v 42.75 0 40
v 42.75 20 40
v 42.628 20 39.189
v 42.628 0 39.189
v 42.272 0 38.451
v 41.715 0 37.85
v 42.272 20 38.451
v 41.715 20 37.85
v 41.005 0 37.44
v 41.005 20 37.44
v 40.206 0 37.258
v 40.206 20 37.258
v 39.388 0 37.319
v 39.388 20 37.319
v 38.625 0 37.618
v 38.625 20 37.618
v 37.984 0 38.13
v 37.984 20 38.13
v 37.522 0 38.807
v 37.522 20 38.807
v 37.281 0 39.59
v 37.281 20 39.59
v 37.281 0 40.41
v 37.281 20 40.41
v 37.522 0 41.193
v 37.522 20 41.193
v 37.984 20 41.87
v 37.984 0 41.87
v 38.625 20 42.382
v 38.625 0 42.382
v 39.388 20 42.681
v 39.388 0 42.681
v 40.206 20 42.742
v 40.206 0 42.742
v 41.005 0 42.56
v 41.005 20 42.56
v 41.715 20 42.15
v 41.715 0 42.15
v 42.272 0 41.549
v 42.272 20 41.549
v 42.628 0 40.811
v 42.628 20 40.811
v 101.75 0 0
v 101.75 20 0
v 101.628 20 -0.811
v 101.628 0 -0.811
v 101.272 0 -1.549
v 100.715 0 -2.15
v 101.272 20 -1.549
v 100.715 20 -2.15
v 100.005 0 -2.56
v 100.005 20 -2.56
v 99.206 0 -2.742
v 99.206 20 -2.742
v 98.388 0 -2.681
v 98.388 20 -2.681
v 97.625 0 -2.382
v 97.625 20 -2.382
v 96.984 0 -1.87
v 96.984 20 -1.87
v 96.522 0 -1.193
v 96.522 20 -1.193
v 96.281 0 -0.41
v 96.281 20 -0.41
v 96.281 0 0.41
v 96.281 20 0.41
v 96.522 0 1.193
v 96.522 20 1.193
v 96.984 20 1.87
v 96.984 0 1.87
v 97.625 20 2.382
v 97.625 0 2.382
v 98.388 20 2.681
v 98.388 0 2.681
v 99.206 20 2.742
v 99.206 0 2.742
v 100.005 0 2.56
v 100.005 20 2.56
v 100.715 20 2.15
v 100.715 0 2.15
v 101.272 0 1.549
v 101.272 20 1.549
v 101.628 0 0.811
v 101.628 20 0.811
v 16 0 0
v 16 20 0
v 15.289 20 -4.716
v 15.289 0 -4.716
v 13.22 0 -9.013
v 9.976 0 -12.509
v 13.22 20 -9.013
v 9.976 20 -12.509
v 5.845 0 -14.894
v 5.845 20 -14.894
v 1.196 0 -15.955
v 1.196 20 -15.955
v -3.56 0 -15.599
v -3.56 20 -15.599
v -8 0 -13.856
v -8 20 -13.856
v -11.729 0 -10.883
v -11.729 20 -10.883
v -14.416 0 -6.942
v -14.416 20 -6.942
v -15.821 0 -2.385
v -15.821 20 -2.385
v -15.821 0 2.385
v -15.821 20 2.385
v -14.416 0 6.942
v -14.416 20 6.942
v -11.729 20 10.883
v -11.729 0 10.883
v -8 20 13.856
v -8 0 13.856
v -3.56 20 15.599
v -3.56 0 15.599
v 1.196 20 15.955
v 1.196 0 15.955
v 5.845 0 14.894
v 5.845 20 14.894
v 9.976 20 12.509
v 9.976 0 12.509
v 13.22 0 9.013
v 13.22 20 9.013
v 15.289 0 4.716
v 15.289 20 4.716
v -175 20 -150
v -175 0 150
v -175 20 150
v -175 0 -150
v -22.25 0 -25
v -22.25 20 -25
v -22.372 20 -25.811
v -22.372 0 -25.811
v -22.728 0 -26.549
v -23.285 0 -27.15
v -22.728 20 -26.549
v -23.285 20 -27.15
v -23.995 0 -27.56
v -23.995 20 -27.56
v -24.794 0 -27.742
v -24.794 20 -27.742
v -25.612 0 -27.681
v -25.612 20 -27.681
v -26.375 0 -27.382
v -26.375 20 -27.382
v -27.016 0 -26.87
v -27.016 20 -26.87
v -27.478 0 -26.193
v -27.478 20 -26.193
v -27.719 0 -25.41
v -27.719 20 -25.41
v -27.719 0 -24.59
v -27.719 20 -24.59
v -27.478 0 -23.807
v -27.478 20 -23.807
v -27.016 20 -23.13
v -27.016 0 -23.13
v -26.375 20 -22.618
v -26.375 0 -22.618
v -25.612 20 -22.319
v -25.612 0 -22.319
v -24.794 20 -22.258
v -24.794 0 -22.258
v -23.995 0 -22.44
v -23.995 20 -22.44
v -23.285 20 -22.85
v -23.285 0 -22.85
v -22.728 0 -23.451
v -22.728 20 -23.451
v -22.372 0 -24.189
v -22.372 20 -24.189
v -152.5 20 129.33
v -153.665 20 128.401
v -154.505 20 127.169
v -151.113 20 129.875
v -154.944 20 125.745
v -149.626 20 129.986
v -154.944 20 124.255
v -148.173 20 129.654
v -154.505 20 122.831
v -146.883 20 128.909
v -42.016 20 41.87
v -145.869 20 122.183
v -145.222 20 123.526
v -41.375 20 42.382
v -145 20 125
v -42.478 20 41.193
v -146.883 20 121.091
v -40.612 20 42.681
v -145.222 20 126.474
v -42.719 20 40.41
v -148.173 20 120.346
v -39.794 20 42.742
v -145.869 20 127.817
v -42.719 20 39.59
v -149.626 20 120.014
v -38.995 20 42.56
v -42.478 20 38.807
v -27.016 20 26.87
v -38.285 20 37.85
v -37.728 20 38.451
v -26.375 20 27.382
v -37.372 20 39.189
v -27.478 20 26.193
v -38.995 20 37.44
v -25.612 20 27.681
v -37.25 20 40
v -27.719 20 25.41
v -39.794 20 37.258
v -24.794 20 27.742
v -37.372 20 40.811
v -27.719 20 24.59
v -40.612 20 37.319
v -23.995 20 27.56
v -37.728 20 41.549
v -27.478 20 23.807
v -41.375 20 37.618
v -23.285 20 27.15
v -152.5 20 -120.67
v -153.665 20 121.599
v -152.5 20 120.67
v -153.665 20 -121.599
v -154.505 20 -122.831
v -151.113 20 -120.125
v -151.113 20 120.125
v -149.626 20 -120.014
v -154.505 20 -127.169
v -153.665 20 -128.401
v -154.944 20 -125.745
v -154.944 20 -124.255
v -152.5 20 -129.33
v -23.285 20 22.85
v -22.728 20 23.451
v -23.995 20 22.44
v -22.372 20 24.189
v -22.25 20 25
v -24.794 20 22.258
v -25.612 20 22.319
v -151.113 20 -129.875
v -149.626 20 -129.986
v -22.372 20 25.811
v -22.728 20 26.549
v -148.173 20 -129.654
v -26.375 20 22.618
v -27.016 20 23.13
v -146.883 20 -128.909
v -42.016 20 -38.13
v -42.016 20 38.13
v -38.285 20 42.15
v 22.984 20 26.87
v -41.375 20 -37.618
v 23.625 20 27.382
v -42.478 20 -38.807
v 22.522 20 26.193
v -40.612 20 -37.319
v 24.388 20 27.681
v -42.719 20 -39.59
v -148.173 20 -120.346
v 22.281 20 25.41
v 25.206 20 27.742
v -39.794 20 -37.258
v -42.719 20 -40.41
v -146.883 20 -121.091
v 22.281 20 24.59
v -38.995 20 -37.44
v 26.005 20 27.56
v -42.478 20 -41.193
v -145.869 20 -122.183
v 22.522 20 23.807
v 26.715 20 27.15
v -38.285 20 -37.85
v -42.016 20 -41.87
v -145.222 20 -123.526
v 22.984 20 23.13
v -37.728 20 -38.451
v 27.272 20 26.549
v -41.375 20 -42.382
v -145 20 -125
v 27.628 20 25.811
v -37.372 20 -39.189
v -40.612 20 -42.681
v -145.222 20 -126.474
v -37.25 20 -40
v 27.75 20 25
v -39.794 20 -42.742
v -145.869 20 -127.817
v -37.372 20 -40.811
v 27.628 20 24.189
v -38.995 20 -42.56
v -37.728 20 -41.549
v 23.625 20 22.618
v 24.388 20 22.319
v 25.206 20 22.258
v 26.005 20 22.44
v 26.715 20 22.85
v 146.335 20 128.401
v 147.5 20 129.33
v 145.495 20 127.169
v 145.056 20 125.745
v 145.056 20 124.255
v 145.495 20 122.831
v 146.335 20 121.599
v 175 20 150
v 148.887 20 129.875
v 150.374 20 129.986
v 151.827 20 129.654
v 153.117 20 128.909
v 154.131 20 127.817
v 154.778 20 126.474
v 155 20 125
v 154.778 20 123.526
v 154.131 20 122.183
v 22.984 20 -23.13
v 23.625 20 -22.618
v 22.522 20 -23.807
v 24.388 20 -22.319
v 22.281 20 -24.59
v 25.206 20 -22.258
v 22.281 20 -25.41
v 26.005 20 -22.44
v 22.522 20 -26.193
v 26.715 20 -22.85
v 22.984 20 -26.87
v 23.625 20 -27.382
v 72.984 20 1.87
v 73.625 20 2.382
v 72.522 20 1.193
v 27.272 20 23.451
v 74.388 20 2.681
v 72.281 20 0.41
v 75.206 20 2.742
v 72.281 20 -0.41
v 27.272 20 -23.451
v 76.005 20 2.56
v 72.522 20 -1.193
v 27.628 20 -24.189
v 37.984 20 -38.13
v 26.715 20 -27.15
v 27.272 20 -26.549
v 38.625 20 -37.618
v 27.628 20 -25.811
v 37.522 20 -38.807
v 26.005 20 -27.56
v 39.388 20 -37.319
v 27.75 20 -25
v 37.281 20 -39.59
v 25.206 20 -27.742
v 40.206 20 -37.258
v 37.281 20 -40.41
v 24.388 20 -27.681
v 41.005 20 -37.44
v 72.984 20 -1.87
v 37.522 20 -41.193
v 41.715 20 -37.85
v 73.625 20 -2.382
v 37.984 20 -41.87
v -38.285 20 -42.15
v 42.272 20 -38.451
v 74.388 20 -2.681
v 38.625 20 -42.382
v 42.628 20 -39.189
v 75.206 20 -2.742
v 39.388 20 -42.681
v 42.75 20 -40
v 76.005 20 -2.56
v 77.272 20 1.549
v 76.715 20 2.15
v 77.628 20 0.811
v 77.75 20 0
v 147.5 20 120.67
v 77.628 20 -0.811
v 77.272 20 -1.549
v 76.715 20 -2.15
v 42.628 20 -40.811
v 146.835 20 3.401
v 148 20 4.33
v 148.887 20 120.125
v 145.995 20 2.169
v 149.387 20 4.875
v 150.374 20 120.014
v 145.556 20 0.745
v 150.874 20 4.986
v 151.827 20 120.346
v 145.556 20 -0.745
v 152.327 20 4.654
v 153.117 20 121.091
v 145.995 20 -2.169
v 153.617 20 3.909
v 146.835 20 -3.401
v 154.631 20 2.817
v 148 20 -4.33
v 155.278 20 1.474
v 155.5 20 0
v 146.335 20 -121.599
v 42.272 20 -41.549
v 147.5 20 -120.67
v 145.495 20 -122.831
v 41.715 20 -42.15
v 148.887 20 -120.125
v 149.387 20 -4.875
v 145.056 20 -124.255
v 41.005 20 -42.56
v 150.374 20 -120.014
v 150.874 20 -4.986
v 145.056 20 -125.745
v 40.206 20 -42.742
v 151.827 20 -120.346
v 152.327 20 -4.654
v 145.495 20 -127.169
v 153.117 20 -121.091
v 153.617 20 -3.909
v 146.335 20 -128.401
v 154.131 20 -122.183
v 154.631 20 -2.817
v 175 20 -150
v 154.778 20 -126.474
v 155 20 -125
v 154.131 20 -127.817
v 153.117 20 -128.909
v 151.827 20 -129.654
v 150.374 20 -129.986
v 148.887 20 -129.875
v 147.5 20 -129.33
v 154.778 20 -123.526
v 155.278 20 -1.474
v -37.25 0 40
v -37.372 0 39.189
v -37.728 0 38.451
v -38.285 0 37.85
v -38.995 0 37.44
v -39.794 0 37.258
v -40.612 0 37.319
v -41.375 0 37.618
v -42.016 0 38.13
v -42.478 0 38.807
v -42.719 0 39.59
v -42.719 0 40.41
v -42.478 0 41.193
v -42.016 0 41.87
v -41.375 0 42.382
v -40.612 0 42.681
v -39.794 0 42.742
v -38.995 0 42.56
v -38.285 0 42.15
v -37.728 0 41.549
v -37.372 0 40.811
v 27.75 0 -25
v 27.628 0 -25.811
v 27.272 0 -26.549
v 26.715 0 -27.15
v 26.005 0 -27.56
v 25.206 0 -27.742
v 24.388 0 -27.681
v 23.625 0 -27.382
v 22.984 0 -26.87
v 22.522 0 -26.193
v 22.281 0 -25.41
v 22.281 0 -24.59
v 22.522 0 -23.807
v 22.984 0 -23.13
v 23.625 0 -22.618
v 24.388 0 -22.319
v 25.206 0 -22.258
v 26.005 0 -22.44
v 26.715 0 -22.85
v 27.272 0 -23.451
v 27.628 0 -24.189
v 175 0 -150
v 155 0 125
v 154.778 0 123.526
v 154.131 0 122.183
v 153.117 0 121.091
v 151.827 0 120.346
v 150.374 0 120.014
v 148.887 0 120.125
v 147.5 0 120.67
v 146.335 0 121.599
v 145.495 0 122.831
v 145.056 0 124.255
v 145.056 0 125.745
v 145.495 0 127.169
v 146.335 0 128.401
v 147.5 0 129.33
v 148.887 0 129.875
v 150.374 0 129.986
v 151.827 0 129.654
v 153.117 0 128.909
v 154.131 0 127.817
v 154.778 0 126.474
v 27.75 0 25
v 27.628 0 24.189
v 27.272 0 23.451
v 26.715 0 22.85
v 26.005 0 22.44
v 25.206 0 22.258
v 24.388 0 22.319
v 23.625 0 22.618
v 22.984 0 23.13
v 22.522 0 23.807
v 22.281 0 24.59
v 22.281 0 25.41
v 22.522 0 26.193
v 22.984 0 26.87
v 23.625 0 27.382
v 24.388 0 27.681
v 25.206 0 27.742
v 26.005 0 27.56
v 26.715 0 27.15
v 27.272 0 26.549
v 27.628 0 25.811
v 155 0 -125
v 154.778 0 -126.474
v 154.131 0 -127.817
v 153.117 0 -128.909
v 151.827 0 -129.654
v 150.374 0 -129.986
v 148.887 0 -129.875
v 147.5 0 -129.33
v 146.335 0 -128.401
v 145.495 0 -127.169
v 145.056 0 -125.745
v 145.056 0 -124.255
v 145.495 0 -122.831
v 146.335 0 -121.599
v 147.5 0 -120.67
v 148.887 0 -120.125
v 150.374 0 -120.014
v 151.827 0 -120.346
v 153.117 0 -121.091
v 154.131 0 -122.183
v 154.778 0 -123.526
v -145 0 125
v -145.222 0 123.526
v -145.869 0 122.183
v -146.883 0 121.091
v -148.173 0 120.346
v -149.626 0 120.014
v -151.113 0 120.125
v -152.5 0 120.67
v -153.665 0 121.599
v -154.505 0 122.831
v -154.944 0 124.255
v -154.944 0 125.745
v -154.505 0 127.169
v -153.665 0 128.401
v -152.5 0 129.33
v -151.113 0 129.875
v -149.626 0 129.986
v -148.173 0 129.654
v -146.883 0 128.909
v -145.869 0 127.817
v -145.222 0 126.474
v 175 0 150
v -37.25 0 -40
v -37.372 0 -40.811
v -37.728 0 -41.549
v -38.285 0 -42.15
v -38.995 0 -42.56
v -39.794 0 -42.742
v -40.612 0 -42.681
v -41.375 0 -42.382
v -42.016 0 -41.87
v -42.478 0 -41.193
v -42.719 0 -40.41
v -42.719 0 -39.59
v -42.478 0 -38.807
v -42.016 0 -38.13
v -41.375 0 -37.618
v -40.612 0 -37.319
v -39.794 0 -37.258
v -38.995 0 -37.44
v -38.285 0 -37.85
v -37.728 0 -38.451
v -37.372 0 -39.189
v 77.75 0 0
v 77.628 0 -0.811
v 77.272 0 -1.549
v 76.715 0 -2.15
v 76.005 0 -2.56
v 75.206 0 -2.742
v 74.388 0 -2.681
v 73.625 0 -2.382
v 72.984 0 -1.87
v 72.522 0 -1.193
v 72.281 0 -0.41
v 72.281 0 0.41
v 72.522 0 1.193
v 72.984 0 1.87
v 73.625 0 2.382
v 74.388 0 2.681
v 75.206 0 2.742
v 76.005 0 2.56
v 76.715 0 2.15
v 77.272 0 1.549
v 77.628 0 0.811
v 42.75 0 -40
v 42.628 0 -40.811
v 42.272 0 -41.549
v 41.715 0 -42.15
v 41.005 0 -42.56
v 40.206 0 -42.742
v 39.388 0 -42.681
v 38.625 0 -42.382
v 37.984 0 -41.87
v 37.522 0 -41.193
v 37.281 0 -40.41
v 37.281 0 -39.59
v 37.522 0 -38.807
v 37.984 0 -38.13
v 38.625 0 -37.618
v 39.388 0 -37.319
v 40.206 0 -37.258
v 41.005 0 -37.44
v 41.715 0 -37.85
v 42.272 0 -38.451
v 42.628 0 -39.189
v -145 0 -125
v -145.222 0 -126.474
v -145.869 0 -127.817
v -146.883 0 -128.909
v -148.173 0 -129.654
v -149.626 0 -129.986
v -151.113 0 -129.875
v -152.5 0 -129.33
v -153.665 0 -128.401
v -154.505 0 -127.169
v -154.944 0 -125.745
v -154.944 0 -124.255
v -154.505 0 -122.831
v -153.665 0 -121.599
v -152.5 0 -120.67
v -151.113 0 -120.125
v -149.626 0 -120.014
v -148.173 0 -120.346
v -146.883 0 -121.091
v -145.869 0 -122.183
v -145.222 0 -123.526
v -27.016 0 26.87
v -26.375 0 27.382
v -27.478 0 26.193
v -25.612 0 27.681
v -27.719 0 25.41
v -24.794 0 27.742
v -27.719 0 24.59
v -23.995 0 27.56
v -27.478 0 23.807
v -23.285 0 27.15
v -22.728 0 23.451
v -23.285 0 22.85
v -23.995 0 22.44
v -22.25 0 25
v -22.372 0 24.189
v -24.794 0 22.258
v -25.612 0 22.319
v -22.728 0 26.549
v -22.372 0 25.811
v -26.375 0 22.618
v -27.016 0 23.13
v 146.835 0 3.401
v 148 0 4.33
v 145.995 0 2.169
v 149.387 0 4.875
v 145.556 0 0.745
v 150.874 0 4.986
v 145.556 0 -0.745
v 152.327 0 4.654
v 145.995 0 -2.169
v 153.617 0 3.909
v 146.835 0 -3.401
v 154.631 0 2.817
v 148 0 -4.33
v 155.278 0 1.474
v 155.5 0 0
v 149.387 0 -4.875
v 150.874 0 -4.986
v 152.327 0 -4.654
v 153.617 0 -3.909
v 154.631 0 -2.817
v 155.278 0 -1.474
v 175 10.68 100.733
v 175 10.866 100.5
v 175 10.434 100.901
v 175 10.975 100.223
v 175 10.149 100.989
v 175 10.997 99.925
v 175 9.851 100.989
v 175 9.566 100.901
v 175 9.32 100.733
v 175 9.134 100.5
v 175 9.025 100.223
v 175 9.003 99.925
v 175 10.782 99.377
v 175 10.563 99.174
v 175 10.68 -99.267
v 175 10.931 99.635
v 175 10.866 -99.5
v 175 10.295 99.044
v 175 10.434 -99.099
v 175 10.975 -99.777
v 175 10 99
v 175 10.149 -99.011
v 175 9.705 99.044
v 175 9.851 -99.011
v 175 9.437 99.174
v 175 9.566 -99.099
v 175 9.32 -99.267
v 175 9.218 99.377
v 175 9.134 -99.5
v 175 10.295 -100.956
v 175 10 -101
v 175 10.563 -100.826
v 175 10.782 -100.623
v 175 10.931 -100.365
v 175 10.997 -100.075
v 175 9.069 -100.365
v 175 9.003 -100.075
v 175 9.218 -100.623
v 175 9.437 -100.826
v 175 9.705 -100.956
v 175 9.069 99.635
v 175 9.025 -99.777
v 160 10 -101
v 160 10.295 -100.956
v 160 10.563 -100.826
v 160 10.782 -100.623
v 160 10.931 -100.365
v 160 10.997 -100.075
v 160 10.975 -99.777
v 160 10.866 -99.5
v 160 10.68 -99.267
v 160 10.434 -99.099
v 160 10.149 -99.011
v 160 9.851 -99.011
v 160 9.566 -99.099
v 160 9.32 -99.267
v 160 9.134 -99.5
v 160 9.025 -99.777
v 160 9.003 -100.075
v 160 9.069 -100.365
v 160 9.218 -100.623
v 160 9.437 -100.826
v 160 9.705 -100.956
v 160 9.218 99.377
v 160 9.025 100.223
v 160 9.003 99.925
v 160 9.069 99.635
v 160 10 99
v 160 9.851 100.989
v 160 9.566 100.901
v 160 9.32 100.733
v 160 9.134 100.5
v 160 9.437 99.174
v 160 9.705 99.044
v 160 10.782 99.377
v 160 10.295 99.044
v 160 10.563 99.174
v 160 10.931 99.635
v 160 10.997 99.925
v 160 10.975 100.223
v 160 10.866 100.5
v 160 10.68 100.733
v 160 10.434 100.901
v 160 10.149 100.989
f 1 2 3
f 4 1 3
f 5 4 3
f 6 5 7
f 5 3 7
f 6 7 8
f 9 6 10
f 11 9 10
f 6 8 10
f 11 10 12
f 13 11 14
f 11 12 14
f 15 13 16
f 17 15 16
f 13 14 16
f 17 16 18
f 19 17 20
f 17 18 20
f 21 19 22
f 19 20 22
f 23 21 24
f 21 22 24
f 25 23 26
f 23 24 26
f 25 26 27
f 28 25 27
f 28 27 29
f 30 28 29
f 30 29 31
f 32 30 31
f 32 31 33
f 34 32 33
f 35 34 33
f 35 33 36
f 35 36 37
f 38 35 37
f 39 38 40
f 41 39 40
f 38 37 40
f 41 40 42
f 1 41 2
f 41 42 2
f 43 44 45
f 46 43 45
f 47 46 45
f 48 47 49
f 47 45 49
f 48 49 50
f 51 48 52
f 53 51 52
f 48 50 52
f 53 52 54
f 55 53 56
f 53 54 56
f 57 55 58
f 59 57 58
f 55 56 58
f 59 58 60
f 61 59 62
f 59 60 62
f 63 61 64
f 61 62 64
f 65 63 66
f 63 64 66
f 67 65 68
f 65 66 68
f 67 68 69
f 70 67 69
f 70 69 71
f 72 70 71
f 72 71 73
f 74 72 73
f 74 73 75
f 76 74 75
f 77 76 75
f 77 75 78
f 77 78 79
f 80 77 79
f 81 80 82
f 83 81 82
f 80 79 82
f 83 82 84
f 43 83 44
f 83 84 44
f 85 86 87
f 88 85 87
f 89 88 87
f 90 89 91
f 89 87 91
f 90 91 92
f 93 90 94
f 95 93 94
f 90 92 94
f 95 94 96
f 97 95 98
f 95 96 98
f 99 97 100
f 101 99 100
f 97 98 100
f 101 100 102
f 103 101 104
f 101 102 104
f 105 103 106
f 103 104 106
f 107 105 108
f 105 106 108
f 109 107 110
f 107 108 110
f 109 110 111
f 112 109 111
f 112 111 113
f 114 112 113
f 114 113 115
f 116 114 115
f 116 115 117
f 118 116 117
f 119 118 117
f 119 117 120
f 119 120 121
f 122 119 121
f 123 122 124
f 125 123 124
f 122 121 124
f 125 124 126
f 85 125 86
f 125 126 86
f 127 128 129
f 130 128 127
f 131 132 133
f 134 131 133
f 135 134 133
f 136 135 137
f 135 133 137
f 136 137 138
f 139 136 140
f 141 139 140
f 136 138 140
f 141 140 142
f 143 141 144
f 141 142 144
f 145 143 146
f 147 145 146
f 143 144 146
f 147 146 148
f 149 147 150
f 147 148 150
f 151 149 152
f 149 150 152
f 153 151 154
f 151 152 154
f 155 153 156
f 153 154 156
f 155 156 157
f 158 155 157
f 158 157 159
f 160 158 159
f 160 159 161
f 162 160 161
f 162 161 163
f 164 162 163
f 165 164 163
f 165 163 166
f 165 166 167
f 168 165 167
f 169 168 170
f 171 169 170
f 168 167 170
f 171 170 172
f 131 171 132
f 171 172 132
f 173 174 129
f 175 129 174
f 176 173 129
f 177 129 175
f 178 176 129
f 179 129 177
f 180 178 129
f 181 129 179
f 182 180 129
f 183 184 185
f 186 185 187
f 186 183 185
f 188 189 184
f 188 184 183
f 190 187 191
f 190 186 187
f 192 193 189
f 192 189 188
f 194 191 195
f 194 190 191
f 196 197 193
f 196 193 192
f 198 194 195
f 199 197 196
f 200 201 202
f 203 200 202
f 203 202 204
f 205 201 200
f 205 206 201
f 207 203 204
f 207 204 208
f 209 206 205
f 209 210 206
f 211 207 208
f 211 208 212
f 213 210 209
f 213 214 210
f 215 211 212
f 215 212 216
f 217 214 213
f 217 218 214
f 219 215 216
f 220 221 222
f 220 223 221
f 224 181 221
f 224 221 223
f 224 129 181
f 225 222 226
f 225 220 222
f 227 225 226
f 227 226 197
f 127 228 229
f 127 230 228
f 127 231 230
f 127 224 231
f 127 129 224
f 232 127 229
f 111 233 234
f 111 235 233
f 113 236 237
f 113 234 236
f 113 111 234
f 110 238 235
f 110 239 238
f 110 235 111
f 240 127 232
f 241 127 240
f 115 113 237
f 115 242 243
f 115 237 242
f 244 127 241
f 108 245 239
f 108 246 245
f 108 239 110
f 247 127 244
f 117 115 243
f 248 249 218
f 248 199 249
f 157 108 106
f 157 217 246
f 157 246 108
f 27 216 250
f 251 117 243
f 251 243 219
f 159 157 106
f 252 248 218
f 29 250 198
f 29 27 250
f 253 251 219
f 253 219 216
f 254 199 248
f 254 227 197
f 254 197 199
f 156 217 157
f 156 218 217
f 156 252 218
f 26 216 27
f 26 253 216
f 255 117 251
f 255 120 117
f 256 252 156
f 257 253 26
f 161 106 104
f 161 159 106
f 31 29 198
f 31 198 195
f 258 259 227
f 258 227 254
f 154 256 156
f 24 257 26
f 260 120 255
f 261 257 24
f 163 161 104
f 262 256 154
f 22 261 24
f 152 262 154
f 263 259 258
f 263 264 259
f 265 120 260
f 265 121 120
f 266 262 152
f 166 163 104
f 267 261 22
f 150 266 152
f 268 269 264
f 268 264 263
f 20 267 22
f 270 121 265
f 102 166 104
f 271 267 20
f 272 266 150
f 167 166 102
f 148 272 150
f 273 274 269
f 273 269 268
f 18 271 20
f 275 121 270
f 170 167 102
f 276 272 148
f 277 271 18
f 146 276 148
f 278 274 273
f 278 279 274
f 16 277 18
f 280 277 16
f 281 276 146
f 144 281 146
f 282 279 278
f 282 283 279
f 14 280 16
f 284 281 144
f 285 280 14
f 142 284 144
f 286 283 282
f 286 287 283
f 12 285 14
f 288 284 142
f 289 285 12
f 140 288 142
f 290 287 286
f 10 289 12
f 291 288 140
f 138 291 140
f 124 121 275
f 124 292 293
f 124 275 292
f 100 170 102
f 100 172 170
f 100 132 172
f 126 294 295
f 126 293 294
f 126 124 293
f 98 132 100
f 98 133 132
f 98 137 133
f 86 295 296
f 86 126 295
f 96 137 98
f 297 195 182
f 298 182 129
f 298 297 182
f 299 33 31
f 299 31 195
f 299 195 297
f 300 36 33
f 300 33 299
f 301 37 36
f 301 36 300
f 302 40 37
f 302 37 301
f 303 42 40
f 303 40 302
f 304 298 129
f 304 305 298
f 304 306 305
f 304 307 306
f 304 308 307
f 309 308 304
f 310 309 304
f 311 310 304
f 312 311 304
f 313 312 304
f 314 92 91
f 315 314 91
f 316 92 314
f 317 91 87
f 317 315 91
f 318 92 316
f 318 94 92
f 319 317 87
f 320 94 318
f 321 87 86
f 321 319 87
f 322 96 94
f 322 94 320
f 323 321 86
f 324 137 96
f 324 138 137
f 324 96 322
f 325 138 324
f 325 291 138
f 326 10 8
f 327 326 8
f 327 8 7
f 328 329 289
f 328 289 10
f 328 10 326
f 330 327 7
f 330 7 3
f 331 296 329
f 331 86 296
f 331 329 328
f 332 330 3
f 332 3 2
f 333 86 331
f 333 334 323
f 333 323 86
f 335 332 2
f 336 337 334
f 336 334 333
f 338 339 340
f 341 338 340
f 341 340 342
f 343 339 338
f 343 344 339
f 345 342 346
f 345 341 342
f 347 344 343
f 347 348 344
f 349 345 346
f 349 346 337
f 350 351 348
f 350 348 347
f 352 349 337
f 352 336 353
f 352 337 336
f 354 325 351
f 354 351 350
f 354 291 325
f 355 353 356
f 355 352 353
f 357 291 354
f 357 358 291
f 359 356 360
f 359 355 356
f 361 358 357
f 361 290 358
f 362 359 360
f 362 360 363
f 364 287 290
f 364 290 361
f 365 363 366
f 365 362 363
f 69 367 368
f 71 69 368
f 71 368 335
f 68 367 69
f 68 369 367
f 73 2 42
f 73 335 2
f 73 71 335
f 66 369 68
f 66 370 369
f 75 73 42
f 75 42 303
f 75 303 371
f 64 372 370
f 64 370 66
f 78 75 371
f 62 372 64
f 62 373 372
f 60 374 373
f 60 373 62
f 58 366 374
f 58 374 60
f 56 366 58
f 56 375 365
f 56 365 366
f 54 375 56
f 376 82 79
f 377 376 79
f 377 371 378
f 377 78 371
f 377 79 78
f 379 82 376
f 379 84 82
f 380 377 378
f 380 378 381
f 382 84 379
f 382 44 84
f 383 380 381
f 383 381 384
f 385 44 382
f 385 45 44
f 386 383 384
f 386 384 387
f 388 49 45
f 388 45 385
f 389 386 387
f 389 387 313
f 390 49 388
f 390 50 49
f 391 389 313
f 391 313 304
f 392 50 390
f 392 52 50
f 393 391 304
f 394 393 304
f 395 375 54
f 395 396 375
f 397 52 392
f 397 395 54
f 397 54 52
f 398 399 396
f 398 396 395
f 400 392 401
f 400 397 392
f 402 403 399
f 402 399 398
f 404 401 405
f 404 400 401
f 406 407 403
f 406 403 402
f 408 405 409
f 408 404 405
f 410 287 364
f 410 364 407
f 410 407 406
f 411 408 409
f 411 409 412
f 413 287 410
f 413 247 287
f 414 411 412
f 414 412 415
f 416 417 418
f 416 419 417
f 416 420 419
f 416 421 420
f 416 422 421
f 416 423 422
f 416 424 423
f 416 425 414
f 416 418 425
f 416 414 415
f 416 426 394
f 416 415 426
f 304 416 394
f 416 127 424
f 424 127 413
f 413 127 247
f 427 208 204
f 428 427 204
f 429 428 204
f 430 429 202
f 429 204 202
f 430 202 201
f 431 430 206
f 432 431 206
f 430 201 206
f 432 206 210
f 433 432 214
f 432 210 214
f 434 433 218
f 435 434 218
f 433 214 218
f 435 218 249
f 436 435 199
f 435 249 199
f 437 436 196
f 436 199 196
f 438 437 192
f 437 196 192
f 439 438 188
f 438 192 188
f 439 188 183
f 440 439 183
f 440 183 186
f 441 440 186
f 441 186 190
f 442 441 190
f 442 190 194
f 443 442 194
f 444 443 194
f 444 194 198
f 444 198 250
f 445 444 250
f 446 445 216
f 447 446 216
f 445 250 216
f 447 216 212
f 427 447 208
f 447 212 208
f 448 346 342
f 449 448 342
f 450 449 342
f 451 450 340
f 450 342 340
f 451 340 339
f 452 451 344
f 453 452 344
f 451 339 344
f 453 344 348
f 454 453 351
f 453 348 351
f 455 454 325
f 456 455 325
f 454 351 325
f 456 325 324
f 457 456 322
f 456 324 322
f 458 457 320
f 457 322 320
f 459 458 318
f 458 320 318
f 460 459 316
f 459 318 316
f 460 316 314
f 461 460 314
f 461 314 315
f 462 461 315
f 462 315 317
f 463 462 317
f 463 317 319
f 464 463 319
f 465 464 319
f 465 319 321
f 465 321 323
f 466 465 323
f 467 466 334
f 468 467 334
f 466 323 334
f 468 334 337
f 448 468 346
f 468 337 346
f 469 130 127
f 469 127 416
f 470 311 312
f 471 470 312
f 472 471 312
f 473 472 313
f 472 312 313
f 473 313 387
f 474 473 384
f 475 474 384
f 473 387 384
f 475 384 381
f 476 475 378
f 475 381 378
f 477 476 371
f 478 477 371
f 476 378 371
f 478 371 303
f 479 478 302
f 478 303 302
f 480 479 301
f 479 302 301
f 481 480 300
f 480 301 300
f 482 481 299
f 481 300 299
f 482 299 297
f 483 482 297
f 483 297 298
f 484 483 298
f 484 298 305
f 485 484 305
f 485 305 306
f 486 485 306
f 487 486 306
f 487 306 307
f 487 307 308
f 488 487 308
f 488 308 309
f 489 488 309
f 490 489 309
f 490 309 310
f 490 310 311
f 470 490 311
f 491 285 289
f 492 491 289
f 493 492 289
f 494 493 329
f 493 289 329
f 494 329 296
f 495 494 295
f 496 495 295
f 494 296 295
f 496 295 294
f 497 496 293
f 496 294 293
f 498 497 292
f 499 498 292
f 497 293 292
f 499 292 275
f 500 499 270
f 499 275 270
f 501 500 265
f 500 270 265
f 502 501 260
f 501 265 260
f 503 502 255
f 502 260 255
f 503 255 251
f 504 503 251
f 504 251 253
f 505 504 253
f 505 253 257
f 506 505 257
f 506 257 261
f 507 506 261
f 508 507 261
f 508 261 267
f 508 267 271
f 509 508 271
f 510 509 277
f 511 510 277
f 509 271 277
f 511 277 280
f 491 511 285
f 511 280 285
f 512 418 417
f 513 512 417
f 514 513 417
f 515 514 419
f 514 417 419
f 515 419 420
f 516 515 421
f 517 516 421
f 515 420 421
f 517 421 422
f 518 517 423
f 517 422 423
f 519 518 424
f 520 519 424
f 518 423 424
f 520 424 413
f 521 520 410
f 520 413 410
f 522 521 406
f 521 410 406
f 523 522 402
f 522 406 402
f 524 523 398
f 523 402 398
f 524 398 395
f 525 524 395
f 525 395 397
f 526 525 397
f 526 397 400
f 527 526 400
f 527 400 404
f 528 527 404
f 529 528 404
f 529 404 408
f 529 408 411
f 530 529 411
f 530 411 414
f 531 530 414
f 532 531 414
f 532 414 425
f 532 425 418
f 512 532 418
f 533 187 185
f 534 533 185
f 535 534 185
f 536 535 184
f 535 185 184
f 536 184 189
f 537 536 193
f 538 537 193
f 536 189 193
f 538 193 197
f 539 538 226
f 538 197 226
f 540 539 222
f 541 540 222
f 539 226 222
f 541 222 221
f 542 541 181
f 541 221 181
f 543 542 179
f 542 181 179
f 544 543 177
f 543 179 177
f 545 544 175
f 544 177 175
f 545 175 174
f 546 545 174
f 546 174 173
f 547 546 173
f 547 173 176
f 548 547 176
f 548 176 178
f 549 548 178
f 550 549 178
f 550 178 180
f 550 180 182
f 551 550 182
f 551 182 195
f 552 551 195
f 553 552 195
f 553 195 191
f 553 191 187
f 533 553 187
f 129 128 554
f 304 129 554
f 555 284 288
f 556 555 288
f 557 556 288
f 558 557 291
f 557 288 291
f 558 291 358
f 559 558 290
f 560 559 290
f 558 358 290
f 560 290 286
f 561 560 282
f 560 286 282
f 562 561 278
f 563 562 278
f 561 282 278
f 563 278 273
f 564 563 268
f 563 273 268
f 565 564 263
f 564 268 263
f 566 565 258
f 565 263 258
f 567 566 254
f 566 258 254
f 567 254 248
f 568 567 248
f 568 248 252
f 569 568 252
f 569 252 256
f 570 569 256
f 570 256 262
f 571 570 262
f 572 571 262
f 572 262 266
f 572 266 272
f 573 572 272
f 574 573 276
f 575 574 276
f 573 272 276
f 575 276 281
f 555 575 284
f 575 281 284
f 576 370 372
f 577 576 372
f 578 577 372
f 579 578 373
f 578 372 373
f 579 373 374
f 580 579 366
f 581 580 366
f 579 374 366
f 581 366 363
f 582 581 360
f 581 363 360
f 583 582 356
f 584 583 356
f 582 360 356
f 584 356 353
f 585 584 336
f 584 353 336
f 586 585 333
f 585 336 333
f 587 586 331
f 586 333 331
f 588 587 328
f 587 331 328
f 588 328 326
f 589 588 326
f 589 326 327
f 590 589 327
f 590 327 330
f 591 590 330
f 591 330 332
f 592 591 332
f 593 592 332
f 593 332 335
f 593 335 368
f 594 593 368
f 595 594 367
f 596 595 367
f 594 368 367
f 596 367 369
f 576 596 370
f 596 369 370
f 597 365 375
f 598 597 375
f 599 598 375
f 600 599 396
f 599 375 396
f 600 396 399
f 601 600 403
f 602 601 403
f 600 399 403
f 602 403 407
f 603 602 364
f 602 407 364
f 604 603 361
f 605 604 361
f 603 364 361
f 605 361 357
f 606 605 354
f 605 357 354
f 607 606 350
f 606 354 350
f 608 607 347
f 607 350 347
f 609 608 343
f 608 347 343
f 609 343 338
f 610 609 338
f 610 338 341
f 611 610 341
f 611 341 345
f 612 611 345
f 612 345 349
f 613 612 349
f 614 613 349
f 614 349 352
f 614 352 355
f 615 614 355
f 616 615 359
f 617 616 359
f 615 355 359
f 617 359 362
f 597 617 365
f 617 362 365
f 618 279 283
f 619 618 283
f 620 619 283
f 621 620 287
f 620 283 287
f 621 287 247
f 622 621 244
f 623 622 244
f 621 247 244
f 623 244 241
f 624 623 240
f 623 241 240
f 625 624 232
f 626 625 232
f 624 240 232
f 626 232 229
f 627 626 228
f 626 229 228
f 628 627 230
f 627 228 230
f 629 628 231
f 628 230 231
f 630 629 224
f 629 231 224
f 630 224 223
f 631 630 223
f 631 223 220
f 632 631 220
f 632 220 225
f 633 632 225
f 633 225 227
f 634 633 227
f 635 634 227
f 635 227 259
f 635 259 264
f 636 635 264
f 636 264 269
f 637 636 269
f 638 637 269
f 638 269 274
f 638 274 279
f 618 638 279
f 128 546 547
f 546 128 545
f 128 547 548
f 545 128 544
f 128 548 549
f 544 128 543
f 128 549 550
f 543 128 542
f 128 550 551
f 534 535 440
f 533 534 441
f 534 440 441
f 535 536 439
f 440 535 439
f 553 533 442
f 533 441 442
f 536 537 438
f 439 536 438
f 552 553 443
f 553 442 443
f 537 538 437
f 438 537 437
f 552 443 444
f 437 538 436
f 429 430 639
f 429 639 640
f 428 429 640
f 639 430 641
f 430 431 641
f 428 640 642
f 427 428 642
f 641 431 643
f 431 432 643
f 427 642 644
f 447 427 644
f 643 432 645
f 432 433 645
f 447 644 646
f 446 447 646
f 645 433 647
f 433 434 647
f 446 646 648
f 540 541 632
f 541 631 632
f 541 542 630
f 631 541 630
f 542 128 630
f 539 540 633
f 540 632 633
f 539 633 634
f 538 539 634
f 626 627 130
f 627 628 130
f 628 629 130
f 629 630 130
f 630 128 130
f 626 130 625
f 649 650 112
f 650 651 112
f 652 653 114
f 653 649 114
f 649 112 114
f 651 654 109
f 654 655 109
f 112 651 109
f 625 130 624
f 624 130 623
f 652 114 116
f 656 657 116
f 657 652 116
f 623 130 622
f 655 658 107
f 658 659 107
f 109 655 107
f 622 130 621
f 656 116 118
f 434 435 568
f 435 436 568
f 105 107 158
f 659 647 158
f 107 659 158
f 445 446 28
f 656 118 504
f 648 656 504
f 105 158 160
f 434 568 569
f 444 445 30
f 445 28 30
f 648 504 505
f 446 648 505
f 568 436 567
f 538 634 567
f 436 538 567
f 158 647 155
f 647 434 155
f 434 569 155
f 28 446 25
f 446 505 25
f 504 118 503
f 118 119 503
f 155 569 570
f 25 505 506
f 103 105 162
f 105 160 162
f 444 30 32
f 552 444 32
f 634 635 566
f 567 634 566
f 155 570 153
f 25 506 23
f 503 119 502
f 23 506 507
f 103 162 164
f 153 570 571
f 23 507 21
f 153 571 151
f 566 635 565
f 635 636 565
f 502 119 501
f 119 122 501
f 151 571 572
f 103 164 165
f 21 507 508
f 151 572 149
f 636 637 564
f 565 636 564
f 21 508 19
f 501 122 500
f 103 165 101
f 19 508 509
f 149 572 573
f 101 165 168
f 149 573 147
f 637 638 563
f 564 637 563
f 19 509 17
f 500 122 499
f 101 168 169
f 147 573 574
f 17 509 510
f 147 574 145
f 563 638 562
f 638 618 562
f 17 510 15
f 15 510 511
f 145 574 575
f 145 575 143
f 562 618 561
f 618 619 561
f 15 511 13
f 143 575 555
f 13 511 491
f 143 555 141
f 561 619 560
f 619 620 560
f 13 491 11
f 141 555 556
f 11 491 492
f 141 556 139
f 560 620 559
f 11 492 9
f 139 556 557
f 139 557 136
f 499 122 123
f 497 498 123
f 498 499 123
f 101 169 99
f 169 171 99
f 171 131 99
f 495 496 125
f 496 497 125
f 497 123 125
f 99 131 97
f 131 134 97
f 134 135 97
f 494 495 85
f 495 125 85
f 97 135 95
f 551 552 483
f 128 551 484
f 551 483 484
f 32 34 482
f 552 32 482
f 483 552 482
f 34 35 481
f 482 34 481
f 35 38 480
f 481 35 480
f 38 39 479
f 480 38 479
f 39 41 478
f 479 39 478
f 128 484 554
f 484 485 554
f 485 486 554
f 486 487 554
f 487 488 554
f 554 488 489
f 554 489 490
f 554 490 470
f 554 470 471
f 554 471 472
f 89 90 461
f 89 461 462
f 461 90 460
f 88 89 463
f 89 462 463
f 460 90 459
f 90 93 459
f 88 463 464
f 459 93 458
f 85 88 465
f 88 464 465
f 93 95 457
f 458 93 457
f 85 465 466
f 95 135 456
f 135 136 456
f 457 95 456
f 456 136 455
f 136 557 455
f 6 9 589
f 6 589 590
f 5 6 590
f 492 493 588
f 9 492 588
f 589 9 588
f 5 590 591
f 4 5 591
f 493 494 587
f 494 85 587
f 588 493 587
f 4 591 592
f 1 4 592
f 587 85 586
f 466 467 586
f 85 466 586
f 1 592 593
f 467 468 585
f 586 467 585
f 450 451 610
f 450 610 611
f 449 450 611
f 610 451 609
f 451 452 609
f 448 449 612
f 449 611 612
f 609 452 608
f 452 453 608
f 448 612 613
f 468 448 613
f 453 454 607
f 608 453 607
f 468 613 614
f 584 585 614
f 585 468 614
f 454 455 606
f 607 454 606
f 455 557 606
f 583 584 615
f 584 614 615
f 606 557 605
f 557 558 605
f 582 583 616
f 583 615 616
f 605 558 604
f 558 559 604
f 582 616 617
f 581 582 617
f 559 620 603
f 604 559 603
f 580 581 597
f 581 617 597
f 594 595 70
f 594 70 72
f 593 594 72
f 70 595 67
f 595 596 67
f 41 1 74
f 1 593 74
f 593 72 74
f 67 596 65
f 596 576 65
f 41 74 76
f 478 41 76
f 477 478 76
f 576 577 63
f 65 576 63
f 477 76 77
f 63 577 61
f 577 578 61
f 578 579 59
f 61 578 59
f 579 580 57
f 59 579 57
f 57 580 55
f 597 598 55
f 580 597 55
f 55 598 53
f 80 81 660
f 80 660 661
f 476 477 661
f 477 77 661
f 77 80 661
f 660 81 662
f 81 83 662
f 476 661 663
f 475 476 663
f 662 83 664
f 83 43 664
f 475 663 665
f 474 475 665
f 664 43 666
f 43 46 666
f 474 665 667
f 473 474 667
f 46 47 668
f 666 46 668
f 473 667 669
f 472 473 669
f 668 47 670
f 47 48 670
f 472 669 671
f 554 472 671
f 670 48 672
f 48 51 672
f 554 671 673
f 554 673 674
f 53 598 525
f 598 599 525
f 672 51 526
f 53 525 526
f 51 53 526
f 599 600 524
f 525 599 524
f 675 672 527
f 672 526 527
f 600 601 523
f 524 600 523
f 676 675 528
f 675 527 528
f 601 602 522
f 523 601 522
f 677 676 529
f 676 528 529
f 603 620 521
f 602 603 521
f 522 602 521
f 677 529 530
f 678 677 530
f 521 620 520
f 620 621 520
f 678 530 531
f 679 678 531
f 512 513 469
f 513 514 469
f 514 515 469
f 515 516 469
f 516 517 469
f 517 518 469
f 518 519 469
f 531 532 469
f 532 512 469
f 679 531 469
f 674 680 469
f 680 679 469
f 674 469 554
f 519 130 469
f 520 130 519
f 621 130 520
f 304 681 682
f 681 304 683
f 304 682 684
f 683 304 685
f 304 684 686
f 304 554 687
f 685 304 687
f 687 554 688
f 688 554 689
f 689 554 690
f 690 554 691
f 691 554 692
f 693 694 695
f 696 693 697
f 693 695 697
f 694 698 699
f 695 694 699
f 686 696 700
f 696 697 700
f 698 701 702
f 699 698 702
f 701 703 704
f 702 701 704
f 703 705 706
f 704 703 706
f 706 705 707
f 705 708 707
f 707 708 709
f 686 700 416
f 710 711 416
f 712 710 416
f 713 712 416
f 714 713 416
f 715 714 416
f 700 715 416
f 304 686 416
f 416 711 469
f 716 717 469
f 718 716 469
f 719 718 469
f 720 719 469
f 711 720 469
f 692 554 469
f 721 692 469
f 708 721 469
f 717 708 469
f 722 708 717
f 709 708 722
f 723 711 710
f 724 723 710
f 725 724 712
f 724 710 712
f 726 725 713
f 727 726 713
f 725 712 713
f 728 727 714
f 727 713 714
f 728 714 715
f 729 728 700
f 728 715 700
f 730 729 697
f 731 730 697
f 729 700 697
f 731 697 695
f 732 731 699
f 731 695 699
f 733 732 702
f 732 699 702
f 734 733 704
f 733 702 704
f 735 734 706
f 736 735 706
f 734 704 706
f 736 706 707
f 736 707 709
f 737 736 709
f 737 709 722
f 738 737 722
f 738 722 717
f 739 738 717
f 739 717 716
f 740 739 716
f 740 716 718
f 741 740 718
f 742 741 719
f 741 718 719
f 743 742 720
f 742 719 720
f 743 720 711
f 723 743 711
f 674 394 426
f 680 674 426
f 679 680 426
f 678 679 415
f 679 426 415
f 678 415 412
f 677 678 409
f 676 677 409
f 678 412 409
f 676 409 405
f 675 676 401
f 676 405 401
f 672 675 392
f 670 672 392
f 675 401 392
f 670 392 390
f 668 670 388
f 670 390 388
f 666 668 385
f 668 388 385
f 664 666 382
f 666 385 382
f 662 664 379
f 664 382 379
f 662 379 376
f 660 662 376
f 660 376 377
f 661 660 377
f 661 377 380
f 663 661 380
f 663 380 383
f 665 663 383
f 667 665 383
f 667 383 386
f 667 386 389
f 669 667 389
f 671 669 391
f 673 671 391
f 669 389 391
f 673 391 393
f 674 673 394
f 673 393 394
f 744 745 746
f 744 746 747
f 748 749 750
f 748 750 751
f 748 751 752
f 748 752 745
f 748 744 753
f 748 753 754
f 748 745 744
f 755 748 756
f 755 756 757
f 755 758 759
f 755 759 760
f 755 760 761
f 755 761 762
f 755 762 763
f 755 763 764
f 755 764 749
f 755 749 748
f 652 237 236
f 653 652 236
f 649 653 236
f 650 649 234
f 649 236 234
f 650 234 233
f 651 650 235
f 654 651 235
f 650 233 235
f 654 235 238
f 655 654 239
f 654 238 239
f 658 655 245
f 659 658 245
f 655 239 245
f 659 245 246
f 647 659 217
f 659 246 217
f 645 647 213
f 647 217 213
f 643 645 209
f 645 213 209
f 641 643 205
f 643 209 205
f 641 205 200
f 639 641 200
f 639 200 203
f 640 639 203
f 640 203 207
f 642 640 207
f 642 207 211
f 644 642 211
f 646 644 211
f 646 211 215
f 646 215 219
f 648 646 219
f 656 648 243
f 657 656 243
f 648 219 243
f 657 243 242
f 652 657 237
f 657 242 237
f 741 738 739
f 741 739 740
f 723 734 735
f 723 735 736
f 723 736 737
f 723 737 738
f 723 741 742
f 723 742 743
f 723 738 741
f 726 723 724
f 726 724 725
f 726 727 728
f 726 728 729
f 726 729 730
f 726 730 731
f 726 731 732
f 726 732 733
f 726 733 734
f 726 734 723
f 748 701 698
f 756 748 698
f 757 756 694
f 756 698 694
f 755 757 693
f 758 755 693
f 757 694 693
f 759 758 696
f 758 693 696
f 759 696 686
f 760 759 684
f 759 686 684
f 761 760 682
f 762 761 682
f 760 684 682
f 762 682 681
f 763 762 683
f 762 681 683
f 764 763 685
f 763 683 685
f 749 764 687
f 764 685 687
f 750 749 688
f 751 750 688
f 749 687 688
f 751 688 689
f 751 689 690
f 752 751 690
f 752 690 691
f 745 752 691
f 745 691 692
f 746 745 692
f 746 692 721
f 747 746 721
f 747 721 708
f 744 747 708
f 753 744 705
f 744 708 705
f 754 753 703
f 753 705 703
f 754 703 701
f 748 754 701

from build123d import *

# Parameters (mm, degrees)
SKETCH1_W           = 350
SKETCH1_H           = 300
BOSS_EXTRUDE1_DEPTH = 20
SKETCH2_R           = 5
CUT_EXTRUDE1_DEPTH  = 21
SKETCH3_R           = 2.75
CUT_EXTRUDE2_DEPTH  = 20
SKETCH4_R           = 5
CUT_EXTRUDE3_DEPTH  = 20
SKETCH5_R           = 2.75
CUT_EXTRUDE4_DEPTH  = 20
SKETCH6_R           = 16
CUT_EXTRUDE5_DEPTH  = 20
SKETCH7_R           = 2.75
CUT_EXTRUDE6_DEPTH  = 20
SKETCH8_R           = 1
CUT_EXTRUDE7_DEPTH  = 15


with BuildPart() as part:
    # Sketch1 → Boss-Extrude1 (new body)
    with BuildSketch(Plane(origin=(0, 0, 0), x_dir=(1, 0, 0), z_dir=(0, 1, 0))):
        Rectangle(SKETCH1_W, SKETCH1_H)
    extrude(amount=BOSS_EXTRUDE1_DEPTH)

    # Sketch2 → Cut-Extrude1 (cut, through all)
    with BuildSketch(Plane(origin=(0, 20, 0), x_dir=(1, 0, 0), z_dir=(0, 1, 0))):
        with Locations((-150, -125)):
            Circle(SKETCH2_R)
        with Locations((-150, 125)):
            Circle(SKETCH2_R)
        with Locations((150, 125)):
            Circle(SKETCH2_R)
        with Locations((150, -125)):
            Circle(SKETCH2_R)
    extrude(amount=-CUT_EXTRUDE1_DEPTH, mode=Mode.SUBTRACT)

    # Sketch3 → Cut-Extrude2 (cut)
    with BuildSketch(Plane(origin=(0, 20, 0), x_dir=(1, 0, 0), z_dir=(0, 1, 0))):
        with Locations((75, 0)):
            Circle(SKETCH3_R)
        with Locations((99, 0)):
            Circle(SKETCH3_R)
    extrude(amount=-CUT_EXTRUDE2_DEPTH, mode=Mode.SUBTRACT)

    # Sketch4 → Cut-Extrude3 (cut)
    with BuildSketch(Plane(origin=(0, 20, 0), x_dir=(1, 0, 0), z_dir=(0, 1, 0))):
        with Locations((150.5, 0)):
            Circle(SKETCH4_R)
    extrude(amount=-CUT_EXTRUDE3_DEPTH, mode=Mode.SUBTRACT)

    # Sketch5 → Cut-Extrude4 (cut)
    with BuildSketch(Plane(origin=(0, 20, 0), x_dir=(1, 0, 0), z_dir=(0, 1, 0))):
        with Locations((-40, 40)):
            Circle(SKETCH5_R)
        with Locations((40, 40)):
            Circle(SKETCH5_R)
        with Locations((40, -40)):
            Circle(SKETCH5_R)
        with Locations((-40, -40)):
            Circle(SKETCH5_R)
    extrude(amount=-CUT_EXTRUDE4_DEPTH, mode=Mode.SUBTRACT)

    # Sketch6 → Cut-Extrude5 (cut)
    with BuildSketch(Plane(origin=(0, 20, 0), x_dir=(1, 0, 0), z_dir=(0, 1, 0))):
        Circle(SKETCH6_R)
    extrude(amount=-CUT_EXTRUDE5_DEPTH, mode=Mode.SUBTRACT)

    # Sketch7 → Cut-Extrude6 (cut)
    with BuildSketch(Plane(origin=(0, 20, 0), x_dir=(1, 0, 0), z_dir=(0, 1, 0))):
        with Locations((-25, 25)):
            Circle(SKETCH7_R)
        with Locations((25, 25)):
            Circle(SKETCH7_R)
        with Locations((25, -25)):
            Circle(SKETCH7_R)
        with Locations((-25, -25)):
            Circle(SKETCH7_R)
    extrude(amount=-CUT_EXTRUDE6_DEPTH, mode=Mode.SUBTRACT)

    # Sketch8 → Cut-Extrude7 (cut)
    with BuildSketch(Plane(origin=(175, 0, 0), x_dir=(0, 0, -1), z_dir=(1, 0, 0))):
        with Locations((-100, 10)):
            Circle(SKETCH8_R)
        with Locations((100, 10)):
            Circle(SKETCH8_R)
    extrude(amount=-CUT_EXTRUDE7_DEPTH, mode=Mode.SUBTRACT)


solid = part.part
